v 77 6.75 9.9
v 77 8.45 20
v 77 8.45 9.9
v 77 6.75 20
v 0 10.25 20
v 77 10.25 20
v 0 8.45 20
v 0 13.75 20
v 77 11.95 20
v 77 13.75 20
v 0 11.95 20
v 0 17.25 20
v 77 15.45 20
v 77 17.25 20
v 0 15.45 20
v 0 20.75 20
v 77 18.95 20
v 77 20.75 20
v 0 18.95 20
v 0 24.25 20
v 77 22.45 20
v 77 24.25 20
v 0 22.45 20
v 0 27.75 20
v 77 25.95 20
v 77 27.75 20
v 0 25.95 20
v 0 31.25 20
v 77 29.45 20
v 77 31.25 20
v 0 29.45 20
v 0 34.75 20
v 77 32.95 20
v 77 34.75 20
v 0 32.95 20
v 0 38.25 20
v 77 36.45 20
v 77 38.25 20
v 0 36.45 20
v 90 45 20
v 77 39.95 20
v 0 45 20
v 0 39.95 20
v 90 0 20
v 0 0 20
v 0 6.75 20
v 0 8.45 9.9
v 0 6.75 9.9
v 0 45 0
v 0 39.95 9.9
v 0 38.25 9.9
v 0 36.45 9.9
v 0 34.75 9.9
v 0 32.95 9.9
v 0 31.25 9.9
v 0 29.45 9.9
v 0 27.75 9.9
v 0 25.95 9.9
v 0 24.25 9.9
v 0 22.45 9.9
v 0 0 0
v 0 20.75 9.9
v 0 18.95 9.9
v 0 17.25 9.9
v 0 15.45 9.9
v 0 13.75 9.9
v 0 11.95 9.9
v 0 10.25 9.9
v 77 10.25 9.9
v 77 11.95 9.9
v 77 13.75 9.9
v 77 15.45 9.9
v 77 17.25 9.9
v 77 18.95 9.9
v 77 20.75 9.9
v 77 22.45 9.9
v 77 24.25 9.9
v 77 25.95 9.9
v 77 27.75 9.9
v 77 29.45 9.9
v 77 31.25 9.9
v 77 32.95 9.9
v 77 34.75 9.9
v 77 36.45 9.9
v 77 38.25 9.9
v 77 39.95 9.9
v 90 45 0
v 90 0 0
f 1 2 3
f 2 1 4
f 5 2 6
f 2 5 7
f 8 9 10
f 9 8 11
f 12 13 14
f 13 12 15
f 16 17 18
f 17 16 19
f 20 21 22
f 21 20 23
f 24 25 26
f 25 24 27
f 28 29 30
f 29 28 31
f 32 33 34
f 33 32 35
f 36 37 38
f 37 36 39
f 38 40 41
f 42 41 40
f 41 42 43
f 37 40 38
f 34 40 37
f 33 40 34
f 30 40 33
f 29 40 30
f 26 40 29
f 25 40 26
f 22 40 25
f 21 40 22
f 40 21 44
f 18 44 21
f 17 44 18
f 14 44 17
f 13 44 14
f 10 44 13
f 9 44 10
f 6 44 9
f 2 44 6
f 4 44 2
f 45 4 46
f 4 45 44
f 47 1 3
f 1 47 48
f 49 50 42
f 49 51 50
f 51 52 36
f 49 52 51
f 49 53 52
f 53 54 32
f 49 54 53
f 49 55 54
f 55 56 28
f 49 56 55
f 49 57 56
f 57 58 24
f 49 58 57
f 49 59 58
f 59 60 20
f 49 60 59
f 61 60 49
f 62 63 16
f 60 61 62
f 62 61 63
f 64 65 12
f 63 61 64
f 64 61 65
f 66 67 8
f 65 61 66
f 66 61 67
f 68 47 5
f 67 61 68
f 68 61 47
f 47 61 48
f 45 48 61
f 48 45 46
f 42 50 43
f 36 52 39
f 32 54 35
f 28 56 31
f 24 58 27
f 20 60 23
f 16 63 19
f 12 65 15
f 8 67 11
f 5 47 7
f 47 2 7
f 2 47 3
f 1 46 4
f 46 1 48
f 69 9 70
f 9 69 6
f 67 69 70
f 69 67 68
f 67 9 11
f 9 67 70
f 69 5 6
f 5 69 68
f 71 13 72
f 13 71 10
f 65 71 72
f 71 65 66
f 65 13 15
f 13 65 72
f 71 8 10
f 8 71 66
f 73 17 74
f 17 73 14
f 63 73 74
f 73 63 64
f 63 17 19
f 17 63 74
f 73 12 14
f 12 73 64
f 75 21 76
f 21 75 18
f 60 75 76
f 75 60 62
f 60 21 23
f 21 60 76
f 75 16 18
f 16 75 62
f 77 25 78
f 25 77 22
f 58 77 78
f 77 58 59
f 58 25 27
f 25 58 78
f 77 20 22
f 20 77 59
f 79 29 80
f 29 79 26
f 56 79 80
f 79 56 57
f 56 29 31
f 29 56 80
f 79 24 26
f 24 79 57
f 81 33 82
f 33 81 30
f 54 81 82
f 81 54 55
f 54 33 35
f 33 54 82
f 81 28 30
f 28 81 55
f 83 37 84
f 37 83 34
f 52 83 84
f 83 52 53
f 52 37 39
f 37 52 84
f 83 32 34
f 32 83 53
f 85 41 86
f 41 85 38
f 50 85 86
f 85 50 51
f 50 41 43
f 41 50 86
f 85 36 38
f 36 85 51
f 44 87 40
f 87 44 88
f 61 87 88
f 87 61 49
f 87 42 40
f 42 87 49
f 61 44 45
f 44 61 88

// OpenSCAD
// Drying Rack for Microscope Slides
// Base: 90 x 45 x 20 mm
// Slots: 10 parallel slots for 75x25mm slides
// Orientation: Rests on XY plane at Z=0, builds upward.

$fn = 128; // High resolution for smooth slot edges

// --- Base Dimensions ---
base_length_X = 90;
base_width_Y = 45;
base_height_Z = 20;

// --- Slot Dimensions ---
num_slots = 10;
slide_length = 75;
slide_width = 25;
slot_width = 1.6; // Width of the slot in Y
slot_depth = 10;  // Depth of the cut in Z
slot_spacing = 3.5; // Centre-to-centre distance in Y

// --- Calculated Positions ---
// Group of slots centred on the block in X and Y
// Total width of slots + spacing
total_slot_width = (num_slots - 1) * slot_spacing + slot_width;
offset_Y = (base_width_Y - total_slot_width) / 2;

// --- Main Block ---
difference() {
    // 1. Create the solid base block
    cube([base_length_X, base_width_Y, base_height_Z], center = false);
    
    // 2. Cut the 10 parallel slots
    // Slots run along X, so we extrude a rectangle along the X-axis
    for (i = [0 : num_slots - 1]) {
        // Calculate Y position for this slot
        // Start at offset_Y, then add (i * spacing) + (half_slot_width) to center the slot
        y_pos = offset_Y + (i * slot_spacing) + (slot_width / 2);
        
        // Define the cutting shape
        // The slot is 77mm long (user specified 77mm long slot, slightly longer than 75mm slide)
        // Width is slot_width in Y
        // Depth is slot_depth in Z
        // We extend slightly past the faces to ensure clean cuts (Rule 5)
        cut_length = 77; 
        cut_width = slot_width + 0.1; // Slight overcut in Y
        cut_depth = slot_depth + 0.1; // Slight overcut in Z
        
        translate([0, y_pos, base_height_Z - cut_depth]) {
            // Extrude along X axis
            cube([cut_length, cut_width, cut_depth], center = false);
        }
    }
}
